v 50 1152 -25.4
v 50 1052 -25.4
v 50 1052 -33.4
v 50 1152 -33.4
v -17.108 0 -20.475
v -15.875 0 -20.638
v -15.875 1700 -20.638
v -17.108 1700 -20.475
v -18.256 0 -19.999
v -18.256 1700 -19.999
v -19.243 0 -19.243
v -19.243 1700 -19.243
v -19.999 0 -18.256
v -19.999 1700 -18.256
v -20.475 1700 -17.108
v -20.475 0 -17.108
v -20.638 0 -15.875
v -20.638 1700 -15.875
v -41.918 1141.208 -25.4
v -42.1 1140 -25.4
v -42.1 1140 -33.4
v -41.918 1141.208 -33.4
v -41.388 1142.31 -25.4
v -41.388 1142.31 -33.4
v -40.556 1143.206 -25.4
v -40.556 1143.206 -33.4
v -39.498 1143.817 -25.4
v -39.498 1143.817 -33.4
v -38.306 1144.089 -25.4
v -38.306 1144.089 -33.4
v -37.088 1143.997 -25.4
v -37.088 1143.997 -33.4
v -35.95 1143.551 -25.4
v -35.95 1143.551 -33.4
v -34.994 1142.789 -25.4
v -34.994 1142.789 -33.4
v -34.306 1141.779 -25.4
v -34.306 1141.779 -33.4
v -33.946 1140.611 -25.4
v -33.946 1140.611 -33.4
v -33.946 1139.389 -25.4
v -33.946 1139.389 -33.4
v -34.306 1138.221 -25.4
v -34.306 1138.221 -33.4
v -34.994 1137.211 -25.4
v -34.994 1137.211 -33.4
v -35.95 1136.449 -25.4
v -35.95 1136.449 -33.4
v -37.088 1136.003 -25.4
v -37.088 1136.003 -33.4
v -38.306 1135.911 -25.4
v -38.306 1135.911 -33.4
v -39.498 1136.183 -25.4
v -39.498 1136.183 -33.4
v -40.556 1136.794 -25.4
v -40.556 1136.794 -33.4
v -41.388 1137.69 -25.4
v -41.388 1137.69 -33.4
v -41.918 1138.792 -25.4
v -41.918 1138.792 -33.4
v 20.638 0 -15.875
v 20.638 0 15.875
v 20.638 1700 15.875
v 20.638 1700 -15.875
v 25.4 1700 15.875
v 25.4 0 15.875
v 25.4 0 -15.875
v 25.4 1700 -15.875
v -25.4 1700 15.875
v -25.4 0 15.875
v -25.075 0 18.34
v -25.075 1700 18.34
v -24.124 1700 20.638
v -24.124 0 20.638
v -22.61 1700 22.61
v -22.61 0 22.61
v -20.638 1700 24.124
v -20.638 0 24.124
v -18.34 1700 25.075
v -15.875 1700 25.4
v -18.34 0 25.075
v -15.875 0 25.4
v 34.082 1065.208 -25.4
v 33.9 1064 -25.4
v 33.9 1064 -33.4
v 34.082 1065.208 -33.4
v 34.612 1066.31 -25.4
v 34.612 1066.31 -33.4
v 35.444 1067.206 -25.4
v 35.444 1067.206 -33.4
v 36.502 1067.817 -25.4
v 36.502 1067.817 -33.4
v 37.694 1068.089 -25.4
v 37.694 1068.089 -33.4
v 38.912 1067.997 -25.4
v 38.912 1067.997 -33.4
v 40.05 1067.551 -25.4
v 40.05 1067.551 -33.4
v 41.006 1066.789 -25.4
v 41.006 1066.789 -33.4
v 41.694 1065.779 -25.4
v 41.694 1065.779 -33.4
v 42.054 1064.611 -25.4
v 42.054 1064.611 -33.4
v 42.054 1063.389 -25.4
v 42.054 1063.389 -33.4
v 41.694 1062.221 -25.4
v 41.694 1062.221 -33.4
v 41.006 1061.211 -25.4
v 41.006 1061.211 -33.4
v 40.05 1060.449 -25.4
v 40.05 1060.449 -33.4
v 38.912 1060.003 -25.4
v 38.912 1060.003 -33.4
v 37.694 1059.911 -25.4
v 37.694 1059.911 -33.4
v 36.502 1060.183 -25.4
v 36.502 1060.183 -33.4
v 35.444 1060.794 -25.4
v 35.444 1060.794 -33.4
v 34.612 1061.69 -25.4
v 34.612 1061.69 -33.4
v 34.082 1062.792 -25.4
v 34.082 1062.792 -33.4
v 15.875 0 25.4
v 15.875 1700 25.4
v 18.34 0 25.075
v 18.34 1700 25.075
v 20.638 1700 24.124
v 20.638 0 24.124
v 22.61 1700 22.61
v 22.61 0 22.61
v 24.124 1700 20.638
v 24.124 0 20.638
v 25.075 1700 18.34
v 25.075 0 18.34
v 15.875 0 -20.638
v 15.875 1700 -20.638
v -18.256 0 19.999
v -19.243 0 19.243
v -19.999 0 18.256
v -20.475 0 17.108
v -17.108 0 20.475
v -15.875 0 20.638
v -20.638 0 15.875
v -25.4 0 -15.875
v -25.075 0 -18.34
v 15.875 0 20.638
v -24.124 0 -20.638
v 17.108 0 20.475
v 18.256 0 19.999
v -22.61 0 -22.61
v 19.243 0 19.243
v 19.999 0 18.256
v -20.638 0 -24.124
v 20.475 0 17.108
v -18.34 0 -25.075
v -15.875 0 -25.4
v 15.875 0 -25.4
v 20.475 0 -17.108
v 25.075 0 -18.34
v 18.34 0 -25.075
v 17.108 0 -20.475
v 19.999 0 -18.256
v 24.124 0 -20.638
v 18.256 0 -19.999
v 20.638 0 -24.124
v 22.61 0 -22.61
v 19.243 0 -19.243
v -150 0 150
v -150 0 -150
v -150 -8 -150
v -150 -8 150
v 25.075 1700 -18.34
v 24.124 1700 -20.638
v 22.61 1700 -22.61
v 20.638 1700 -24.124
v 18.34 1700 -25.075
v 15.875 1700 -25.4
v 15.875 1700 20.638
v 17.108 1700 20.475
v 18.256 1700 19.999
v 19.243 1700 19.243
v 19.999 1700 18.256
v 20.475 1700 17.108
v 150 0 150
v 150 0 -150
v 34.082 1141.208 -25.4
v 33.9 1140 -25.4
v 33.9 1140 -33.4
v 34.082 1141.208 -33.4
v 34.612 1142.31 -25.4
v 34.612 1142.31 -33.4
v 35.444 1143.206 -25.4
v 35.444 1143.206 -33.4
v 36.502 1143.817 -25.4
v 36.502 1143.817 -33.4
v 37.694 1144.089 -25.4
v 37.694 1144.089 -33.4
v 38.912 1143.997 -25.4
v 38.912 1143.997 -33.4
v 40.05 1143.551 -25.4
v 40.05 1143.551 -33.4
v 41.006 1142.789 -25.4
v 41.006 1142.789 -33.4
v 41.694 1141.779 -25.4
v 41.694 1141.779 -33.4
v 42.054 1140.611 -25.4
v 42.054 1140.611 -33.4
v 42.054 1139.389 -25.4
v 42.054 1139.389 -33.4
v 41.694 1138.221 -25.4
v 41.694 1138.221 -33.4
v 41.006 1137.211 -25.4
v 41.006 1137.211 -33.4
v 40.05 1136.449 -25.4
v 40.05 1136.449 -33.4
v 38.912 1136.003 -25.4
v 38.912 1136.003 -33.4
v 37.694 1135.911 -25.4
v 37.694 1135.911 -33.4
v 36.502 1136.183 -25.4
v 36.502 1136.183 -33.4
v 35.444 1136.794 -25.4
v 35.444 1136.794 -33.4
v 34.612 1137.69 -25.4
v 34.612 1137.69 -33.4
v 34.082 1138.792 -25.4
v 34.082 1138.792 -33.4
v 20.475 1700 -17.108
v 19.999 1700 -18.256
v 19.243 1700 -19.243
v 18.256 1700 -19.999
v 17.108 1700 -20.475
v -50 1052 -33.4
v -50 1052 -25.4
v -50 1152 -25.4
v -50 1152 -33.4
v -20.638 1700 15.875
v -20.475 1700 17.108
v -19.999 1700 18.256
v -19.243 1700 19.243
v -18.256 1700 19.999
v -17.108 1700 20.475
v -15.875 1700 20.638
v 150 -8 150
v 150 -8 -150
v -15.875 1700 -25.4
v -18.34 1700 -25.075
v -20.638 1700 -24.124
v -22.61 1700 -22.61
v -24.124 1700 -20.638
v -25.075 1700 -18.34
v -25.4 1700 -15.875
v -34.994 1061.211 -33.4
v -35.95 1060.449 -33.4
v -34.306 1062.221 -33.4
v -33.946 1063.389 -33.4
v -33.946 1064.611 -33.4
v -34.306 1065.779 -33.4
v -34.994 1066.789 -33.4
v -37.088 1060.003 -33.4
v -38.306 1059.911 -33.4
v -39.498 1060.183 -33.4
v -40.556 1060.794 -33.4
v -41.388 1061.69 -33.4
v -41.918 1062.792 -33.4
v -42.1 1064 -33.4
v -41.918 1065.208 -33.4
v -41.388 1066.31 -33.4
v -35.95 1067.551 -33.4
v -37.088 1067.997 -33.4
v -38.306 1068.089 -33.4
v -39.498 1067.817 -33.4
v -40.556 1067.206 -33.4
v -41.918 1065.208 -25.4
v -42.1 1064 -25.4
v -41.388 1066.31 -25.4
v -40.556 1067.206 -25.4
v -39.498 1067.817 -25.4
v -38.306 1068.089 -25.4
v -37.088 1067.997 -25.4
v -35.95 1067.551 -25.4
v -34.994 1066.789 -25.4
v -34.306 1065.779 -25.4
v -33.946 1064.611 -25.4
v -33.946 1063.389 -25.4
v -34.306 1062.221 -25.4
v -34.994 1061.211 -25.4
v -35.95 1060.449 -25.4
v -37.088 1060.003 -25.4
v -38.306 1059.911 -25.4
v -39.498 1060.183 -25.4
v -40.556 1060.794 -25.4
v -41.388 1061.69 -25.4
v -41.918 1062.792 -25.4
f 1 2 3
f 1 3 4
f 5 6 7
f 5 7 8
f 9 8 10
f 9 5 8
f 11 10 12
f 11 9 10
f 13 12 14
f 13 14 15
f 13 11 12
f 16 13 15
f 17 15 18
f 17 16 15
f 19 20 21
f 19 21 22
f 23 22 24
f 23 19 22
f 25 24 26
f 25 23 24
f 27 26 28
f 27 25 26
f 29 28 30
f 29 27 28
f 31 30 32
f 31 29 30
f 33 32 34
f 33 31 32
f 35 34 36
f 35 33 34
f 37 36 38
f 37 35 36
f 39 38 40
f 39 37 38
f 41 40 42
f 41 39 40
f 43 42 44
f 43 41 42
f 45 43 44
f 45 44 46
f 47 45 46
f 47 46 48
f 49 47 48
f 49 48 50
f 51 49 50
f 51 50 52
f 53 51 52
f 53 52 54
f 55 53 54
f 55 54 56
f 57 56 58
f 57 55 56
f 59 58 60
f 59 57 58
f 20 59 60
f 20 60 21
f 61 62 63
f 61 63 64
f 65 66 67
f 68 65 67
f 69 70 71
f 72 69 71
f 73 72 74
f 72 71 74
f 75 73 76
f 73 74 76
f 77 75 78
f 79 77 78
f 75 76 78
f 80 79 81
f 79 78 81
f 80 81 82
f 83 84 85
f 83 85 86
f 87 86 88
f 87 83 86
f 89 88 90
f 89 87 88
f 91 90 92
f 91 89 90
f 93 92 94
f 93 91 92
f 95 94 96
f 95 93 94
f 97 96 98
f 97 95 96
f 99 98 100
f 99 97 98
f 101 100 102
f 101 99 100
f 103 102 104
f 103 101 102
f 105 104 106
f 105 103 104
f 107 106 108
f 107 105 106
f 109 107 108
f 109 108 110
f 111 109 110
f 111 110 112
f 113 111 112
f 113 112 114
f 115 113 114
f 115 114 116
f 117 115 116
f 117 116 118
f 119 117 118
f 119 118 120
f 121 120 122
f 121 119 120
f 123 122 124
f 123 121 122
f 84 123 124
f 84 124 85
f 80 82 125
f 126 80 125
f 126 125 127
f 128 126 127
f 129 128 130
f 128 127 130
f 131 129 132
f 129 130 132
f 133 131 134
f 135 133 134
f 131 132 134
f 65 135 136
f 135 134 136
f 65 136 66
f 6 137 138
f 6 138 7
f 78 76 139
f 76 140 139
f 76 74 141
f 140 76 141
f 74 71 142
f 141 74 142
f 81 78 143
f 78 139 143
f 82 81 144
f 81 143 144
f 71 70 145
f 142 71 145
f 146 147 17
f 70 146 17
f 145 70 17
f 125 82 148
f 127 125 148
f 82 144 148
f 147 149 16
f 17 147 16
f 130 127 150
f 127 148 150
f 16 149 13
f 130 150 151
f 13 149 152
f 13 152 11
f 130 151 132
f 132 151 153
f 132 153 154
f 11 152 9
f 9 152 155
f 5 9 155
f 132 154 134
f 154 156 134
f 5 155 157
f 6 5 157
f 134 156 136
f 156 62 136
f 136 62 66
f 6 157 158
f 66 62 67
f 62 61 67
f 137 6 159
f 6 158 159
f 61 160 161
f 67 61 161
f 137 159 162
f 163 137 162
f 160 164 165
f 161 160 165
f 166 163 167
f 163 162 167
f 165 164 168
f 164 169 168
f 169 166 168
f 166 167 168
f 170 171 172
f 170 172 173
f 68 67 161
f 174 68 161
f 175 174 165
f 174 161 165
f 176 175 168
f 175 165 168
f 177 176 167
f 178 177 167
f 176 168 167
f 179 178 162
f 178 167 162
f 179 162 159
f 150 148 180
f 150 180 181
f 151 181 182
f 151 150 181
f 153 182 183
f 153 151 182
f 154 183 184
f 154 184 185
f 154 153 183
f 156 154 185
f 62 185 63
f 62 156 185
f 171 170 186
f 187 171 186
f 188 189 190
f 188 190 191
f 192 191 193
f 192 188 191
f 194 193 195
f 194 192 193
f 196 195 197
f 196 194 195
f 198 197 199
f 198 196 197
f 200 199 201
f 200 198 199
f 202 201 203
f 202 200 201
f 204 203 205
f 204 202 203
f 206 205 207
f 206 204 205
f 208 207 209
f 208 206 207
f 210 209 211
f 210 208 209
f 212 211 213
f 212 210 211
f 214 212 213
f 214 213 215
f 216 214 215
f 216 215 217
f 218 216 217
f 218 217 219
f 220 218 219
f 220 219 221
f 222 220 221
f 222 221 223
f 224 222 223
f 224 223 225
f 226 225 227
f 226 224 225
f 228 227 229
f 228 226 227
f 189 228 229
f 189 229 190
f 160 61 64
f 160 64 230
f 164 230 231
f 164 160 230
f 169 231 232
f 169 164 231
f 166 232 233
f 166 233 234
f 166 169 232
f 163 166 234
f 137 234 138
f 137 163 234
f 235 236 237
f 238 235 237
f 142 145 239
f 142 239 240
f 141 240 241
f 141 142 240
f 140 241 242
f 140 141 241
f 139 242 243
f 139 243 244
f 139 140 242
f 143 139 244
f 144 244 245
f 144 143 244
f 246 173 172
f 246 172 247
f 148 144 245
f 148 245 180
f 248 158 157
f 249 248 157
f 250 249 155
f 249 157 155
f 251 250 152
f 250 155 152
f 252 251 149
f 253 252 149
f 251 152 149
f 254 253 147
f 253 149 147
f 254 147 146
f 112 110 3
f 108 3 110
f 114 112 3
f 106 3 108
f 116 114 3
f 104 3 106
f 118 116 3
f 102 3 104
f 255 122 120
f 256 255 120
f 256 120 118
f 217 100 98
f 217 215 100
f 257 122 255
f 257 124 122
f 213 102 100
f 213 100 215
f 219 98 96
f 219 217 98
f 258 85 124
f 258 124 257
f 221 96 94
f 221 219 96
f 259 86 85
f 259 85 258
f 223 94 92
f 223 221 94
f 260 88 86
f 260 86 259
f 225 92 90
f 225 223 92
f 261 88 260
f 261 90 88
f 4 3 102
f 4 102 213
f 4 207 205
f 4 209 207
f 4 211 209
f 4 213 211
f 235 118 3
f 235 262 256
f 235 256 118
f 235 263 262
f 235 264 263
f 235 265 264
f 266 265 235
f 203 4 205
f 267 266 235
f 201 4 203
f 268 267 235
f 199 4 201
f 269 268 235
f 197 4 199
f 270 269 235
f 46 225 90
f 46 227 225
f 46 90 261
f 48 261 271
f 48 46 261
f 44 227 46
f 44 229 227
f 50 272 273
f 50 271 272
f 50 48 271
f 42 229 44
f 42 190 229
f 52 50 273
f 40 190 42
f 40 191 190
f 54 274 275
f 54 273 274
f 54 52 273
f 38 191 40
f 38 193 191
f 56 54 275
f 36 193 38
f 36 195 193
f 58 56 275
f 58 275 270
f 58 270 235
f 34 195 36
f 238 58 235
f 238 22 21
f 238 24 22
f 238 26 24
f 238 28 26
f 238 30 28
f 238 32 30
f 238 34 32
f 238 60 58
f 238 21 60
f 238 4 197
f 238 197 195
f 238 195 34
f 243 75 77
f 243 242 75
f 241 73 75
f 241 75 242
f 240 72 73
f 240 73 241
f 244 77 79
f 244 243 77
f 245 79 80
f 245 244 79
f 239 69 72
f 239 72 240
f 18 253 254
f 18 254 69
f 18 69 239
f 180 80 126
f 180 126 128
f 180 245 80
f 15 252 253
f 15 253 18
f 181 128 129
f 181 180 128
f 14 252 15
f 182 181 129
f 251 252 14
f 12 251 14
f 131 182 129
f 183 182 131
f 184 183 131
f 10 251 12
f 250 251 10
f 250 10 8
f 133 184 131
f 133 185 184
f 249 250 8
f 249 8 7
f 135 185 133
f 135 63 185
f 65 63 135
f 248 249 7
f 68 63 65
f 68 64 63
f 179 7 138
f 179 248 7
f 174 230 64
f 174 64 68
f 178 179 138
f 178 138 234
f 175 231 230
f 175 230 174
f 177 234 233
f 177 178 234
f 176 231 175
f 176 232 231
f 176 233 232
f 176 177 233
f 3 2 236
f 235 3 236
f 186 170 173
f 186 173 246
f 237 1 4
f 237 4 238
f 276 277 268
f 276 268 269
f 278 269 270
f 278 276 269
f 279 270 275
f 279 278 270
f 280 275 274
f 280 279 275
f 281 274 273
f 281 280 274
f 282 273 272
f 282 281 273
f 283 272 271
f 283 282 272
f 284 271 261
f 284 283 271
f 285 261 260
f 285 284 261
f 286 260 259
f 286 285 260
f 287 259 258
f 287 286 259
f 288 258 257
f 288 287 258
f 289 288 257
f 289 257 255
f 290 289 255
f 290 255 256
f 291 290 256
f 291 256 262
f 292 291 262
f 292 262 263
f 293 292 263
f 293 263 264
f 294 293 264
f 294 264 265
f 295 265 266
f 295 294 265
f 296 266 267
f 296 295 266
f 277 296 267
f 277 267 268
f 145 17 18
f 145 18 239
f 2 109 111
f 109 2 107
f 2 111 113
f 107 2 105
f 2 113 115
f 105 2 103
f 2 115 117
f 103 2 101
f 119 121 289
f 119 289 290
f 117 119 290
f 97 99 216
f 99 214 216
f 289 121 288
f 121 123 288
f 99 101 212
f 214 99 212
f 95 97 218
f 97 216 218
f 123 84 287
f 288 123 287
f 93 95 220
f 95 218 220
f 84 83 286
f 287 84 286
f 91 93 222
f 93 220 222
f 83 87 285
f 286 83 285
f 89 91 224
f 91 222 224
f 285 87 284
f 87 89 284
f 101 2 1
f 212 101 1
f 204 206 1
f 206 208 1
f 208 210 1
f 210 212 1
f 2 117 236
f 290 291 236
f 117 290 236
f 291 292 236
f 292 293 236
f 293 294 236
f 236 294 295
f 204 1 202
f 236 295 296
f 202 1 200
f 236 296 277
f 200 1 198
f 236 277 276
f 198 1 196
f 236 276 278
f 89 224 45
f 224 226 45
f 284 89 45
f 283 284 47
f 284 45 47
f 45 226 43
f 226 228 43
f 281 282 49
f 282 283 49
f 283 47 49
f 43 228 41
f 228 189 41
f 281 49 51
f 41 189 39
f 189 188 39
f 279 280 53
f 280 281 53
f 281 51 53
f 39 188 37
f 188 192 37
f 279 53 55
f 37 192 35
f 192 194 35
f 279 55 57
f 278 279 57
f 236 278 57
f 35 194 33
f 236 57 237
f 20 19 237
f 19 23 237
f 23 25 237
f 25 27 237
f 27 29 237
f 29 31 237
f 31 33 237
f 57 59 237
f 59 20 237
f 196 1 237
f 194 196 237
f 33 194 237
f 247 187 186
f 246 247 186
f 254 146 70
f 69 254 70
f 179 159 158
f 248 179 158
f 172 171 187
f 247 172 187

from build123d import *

# Parameters (mm, degrees)
RURA_CIENKO_CIENNA_KWADRATOWA_TS2X2X0_18_DEPTH = 1700
SZKIC5_W                                       = 300
SZKIC5_H                                       = 300
DODANIE_WYCI_GNI_CIE1_DEPTH                    = 8
SZKIC6_W                                       = 100
SZKIC6_H                                       = 100
SZKIC6_R                                       = 4.1
DODANIE_WYCI_GNI_CIE2_DEPTH                    = 8


with BuildPart() as part:
    # Sketch12 → Rura cienkościenna kwadratowa TS2X2X0.1875(1) (new body)
    with BuildSketch(Plane(origin=(0, 0, 0), x_dir=(1, 0, 0), z_dir=(0, 1, 0))):
        with BuildLine():
            Line((-15.875, -25.4), (15.875, -25.4))
            ThreePointArc((15.875, -25.4), (22.610192091, -22.610192091), (25.4, -15.875))
            Line((25.4, -15.875), (25.4, 15.875))
            ThreePointArc((25.4, 15.875), (22.610192091, 22.610192091), (15.875, 25.4))
            Line((15.875, 25.4), (-15.875, 25.4))
            ThreePointArc((-15.875, 25.4), (-22.610192091, 22.610192091), (-25.4, 15.875))
            Line((-25.4, 15.875), (-25.4, -15.875))
            ThreePointArc((-25.4, -15.875), (-22.610192091, -22.610192091), (-15.875, -25.4))
        make_face()
        with BuildLine():
            Line((-15.875, -20.6375), (15.875, -20.6375))
            ThreePointArc((15.875, -20.6375), (19.242596045, -19.242596045), (20.6375, -15.875))
            Line((20.6375, -15.875), (20.6375, 15.875))
            ThreePointArc((20.6375, 15.875), (19.242596045, 19.242596045), (15.875, 20.6375))
            Line((15.875, 20.6375), (-15.875, 20.6375))
            ThreePointArc((-15.875, 20.6375), (-19.242596045, 19.242596045), (-20.6375, 15.875))
            Line((-20.6375, 15.875), (-20.6375, -15.875))
            ThreePointArc((-20.6375, -15.875), (-19.242596045, -19.242596045), (-15.875, -20.6375))
        make_face(mode=Mode.SUBTRACT)
    extrude(amount=RURA_CIENKO_CIENNA_KWADRATOWA_TS2X2X0_18_DEPTH)


with BuildPart() as body_2:
    # Szkic5 → Dodanie-wyciągnięcie1 (new body)
    with BuildSketch(Plane.XZ):
        Rectangle(SZKIC5_W, SZKIC5_H)
    extrude(amount=DODANIE_WYCI_GNI_CIE1_DEPTH)


with BuildPart() as body_3:
    # Szkic6 → Dodanie-wyciągnięcie2 (new body)
    with BuildSketch(Plane(origin=(0, 0, -25.4), x_dir=(-1, 0, 0), z_dir=(0, 0, -1))):
        with Locations((0, 1102)):
            Rectangle(SZKIC6_W, SZKIC6_H)
        with Locations((-38, 1140)):
            Circle(SZKIC6_R, mode=Mode.SUBTRACT)
        with Locations((38, 1140)):
            Circle(SZKIC6_R, mode=Mode.SUBTRACT)
        with Locations((38, 1064)):
            Circle(SZKIC6_R, mode=Mode.SUBTRACT)
        with Locations((-38, 1064)):
            Circle(SZKIC6_R, mode=Mode.SUBTRACT)
    extrude(amount=DODANIE_WYCI_GNI_CIE2_DEPTH)


solid = Compound([part.part, body_2.part, body_3.part])
